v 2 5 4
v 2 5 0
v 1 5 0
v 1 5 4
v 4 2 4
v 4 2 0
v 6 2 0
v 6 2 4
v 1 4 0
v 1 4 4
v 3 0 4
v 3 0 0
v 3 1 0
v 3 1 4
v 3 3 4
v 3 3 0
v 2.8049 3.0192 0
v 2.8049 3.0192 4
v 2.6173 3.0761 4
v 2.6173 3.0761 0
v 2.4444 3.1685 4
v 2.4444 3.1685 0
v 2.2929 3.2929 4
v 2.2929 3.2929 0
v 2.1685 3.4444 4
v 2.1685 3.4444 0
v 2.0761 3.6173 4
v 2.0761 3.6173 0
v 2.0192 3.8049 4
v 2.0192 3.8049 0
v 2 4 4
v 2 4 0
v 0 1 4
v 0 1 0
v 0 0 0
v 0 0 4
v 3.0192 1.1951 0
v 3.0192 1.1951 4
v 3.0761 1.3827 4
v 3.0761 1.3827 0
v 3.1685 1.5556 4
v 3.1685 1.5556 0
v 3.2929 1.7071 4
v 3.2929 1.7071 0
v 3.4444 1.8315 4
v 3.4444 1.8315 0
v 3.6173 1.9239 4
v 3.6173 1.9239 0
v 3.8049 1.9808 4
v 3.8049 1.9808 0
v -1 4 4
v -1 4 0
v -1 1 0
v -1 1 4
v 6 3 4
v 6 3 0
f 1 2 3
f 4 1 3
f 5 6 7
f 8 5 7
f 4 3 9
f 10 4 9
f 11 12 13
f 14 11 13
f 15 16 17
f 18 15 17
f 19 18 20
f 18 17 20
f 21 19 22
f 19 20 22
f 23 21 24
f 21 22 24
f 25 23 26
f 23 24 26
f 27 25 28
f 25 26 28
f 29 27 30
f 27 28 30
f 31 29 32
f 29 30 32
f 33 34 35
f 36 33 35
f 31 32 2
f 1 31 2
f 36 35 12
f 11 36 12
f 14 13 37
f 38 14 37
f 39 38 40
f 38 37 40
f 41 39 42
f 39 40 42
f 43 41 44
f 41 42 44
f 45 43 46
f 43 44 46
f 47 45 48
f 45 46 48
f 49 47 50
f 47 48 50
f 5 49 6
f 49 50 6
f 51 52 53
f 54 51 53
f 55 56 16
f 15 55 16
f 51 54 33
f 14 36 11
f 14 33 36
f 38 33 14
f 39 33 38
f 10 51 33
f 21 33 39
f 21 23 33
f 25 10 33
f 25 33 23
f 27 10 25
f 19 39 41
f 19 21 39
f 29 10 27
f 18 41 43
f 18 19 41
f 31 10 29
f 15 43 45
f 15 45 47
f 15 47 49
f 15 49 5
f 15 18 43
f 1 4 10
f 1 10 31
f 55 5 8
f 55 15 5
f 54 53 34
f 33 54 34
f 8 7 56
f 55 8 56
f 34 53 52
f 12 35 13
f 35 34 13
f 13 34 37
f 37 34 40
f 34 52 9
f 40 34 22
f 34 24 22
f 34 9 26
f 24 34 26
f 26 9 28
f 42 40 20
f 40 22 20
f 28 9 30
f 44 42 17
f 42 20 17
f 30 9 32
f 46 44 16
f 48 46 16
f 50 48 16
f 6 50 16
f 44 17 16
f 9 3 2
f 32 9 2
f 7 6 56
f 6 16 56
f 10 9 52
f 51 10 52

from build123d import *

# Parameters (mm, degrees)
EXTRUDE_1_DEPTH = 4


with BuildPart() as part:
    # 草圖1 → 填料-伸長1 (new body)
    with BuildSketch(Plane.XY):
        with BuildLine():
            Line((0, 0), (3, 0))
            Line((3, 0), (3, 1))
            ThreePointArc((3, 1), (3.292893219, 1.707106781), (4, 2))
            Line((4, 2), (6, 2))
            Line((6, 2), (6, 3))
            Line((6, 3), (3, 3))
            ThreePointArc((3, 3), (2.292893219, 3.292893219), (2, 4))
            Line((2, 4), (2, 5))
            Line((2, 5), (1, 5))
            Line((1, 5), (1, 4))
            Line((1, 4), (-1, 4))
            Line((-1, 4), (-1, 1))
            Line((-1, 1), (0, 1))
            Line((0, 1), (0, 0))
        make_face()
    extrude(amount=EXTRUDE_1_DEPTH)


solid = part.part
